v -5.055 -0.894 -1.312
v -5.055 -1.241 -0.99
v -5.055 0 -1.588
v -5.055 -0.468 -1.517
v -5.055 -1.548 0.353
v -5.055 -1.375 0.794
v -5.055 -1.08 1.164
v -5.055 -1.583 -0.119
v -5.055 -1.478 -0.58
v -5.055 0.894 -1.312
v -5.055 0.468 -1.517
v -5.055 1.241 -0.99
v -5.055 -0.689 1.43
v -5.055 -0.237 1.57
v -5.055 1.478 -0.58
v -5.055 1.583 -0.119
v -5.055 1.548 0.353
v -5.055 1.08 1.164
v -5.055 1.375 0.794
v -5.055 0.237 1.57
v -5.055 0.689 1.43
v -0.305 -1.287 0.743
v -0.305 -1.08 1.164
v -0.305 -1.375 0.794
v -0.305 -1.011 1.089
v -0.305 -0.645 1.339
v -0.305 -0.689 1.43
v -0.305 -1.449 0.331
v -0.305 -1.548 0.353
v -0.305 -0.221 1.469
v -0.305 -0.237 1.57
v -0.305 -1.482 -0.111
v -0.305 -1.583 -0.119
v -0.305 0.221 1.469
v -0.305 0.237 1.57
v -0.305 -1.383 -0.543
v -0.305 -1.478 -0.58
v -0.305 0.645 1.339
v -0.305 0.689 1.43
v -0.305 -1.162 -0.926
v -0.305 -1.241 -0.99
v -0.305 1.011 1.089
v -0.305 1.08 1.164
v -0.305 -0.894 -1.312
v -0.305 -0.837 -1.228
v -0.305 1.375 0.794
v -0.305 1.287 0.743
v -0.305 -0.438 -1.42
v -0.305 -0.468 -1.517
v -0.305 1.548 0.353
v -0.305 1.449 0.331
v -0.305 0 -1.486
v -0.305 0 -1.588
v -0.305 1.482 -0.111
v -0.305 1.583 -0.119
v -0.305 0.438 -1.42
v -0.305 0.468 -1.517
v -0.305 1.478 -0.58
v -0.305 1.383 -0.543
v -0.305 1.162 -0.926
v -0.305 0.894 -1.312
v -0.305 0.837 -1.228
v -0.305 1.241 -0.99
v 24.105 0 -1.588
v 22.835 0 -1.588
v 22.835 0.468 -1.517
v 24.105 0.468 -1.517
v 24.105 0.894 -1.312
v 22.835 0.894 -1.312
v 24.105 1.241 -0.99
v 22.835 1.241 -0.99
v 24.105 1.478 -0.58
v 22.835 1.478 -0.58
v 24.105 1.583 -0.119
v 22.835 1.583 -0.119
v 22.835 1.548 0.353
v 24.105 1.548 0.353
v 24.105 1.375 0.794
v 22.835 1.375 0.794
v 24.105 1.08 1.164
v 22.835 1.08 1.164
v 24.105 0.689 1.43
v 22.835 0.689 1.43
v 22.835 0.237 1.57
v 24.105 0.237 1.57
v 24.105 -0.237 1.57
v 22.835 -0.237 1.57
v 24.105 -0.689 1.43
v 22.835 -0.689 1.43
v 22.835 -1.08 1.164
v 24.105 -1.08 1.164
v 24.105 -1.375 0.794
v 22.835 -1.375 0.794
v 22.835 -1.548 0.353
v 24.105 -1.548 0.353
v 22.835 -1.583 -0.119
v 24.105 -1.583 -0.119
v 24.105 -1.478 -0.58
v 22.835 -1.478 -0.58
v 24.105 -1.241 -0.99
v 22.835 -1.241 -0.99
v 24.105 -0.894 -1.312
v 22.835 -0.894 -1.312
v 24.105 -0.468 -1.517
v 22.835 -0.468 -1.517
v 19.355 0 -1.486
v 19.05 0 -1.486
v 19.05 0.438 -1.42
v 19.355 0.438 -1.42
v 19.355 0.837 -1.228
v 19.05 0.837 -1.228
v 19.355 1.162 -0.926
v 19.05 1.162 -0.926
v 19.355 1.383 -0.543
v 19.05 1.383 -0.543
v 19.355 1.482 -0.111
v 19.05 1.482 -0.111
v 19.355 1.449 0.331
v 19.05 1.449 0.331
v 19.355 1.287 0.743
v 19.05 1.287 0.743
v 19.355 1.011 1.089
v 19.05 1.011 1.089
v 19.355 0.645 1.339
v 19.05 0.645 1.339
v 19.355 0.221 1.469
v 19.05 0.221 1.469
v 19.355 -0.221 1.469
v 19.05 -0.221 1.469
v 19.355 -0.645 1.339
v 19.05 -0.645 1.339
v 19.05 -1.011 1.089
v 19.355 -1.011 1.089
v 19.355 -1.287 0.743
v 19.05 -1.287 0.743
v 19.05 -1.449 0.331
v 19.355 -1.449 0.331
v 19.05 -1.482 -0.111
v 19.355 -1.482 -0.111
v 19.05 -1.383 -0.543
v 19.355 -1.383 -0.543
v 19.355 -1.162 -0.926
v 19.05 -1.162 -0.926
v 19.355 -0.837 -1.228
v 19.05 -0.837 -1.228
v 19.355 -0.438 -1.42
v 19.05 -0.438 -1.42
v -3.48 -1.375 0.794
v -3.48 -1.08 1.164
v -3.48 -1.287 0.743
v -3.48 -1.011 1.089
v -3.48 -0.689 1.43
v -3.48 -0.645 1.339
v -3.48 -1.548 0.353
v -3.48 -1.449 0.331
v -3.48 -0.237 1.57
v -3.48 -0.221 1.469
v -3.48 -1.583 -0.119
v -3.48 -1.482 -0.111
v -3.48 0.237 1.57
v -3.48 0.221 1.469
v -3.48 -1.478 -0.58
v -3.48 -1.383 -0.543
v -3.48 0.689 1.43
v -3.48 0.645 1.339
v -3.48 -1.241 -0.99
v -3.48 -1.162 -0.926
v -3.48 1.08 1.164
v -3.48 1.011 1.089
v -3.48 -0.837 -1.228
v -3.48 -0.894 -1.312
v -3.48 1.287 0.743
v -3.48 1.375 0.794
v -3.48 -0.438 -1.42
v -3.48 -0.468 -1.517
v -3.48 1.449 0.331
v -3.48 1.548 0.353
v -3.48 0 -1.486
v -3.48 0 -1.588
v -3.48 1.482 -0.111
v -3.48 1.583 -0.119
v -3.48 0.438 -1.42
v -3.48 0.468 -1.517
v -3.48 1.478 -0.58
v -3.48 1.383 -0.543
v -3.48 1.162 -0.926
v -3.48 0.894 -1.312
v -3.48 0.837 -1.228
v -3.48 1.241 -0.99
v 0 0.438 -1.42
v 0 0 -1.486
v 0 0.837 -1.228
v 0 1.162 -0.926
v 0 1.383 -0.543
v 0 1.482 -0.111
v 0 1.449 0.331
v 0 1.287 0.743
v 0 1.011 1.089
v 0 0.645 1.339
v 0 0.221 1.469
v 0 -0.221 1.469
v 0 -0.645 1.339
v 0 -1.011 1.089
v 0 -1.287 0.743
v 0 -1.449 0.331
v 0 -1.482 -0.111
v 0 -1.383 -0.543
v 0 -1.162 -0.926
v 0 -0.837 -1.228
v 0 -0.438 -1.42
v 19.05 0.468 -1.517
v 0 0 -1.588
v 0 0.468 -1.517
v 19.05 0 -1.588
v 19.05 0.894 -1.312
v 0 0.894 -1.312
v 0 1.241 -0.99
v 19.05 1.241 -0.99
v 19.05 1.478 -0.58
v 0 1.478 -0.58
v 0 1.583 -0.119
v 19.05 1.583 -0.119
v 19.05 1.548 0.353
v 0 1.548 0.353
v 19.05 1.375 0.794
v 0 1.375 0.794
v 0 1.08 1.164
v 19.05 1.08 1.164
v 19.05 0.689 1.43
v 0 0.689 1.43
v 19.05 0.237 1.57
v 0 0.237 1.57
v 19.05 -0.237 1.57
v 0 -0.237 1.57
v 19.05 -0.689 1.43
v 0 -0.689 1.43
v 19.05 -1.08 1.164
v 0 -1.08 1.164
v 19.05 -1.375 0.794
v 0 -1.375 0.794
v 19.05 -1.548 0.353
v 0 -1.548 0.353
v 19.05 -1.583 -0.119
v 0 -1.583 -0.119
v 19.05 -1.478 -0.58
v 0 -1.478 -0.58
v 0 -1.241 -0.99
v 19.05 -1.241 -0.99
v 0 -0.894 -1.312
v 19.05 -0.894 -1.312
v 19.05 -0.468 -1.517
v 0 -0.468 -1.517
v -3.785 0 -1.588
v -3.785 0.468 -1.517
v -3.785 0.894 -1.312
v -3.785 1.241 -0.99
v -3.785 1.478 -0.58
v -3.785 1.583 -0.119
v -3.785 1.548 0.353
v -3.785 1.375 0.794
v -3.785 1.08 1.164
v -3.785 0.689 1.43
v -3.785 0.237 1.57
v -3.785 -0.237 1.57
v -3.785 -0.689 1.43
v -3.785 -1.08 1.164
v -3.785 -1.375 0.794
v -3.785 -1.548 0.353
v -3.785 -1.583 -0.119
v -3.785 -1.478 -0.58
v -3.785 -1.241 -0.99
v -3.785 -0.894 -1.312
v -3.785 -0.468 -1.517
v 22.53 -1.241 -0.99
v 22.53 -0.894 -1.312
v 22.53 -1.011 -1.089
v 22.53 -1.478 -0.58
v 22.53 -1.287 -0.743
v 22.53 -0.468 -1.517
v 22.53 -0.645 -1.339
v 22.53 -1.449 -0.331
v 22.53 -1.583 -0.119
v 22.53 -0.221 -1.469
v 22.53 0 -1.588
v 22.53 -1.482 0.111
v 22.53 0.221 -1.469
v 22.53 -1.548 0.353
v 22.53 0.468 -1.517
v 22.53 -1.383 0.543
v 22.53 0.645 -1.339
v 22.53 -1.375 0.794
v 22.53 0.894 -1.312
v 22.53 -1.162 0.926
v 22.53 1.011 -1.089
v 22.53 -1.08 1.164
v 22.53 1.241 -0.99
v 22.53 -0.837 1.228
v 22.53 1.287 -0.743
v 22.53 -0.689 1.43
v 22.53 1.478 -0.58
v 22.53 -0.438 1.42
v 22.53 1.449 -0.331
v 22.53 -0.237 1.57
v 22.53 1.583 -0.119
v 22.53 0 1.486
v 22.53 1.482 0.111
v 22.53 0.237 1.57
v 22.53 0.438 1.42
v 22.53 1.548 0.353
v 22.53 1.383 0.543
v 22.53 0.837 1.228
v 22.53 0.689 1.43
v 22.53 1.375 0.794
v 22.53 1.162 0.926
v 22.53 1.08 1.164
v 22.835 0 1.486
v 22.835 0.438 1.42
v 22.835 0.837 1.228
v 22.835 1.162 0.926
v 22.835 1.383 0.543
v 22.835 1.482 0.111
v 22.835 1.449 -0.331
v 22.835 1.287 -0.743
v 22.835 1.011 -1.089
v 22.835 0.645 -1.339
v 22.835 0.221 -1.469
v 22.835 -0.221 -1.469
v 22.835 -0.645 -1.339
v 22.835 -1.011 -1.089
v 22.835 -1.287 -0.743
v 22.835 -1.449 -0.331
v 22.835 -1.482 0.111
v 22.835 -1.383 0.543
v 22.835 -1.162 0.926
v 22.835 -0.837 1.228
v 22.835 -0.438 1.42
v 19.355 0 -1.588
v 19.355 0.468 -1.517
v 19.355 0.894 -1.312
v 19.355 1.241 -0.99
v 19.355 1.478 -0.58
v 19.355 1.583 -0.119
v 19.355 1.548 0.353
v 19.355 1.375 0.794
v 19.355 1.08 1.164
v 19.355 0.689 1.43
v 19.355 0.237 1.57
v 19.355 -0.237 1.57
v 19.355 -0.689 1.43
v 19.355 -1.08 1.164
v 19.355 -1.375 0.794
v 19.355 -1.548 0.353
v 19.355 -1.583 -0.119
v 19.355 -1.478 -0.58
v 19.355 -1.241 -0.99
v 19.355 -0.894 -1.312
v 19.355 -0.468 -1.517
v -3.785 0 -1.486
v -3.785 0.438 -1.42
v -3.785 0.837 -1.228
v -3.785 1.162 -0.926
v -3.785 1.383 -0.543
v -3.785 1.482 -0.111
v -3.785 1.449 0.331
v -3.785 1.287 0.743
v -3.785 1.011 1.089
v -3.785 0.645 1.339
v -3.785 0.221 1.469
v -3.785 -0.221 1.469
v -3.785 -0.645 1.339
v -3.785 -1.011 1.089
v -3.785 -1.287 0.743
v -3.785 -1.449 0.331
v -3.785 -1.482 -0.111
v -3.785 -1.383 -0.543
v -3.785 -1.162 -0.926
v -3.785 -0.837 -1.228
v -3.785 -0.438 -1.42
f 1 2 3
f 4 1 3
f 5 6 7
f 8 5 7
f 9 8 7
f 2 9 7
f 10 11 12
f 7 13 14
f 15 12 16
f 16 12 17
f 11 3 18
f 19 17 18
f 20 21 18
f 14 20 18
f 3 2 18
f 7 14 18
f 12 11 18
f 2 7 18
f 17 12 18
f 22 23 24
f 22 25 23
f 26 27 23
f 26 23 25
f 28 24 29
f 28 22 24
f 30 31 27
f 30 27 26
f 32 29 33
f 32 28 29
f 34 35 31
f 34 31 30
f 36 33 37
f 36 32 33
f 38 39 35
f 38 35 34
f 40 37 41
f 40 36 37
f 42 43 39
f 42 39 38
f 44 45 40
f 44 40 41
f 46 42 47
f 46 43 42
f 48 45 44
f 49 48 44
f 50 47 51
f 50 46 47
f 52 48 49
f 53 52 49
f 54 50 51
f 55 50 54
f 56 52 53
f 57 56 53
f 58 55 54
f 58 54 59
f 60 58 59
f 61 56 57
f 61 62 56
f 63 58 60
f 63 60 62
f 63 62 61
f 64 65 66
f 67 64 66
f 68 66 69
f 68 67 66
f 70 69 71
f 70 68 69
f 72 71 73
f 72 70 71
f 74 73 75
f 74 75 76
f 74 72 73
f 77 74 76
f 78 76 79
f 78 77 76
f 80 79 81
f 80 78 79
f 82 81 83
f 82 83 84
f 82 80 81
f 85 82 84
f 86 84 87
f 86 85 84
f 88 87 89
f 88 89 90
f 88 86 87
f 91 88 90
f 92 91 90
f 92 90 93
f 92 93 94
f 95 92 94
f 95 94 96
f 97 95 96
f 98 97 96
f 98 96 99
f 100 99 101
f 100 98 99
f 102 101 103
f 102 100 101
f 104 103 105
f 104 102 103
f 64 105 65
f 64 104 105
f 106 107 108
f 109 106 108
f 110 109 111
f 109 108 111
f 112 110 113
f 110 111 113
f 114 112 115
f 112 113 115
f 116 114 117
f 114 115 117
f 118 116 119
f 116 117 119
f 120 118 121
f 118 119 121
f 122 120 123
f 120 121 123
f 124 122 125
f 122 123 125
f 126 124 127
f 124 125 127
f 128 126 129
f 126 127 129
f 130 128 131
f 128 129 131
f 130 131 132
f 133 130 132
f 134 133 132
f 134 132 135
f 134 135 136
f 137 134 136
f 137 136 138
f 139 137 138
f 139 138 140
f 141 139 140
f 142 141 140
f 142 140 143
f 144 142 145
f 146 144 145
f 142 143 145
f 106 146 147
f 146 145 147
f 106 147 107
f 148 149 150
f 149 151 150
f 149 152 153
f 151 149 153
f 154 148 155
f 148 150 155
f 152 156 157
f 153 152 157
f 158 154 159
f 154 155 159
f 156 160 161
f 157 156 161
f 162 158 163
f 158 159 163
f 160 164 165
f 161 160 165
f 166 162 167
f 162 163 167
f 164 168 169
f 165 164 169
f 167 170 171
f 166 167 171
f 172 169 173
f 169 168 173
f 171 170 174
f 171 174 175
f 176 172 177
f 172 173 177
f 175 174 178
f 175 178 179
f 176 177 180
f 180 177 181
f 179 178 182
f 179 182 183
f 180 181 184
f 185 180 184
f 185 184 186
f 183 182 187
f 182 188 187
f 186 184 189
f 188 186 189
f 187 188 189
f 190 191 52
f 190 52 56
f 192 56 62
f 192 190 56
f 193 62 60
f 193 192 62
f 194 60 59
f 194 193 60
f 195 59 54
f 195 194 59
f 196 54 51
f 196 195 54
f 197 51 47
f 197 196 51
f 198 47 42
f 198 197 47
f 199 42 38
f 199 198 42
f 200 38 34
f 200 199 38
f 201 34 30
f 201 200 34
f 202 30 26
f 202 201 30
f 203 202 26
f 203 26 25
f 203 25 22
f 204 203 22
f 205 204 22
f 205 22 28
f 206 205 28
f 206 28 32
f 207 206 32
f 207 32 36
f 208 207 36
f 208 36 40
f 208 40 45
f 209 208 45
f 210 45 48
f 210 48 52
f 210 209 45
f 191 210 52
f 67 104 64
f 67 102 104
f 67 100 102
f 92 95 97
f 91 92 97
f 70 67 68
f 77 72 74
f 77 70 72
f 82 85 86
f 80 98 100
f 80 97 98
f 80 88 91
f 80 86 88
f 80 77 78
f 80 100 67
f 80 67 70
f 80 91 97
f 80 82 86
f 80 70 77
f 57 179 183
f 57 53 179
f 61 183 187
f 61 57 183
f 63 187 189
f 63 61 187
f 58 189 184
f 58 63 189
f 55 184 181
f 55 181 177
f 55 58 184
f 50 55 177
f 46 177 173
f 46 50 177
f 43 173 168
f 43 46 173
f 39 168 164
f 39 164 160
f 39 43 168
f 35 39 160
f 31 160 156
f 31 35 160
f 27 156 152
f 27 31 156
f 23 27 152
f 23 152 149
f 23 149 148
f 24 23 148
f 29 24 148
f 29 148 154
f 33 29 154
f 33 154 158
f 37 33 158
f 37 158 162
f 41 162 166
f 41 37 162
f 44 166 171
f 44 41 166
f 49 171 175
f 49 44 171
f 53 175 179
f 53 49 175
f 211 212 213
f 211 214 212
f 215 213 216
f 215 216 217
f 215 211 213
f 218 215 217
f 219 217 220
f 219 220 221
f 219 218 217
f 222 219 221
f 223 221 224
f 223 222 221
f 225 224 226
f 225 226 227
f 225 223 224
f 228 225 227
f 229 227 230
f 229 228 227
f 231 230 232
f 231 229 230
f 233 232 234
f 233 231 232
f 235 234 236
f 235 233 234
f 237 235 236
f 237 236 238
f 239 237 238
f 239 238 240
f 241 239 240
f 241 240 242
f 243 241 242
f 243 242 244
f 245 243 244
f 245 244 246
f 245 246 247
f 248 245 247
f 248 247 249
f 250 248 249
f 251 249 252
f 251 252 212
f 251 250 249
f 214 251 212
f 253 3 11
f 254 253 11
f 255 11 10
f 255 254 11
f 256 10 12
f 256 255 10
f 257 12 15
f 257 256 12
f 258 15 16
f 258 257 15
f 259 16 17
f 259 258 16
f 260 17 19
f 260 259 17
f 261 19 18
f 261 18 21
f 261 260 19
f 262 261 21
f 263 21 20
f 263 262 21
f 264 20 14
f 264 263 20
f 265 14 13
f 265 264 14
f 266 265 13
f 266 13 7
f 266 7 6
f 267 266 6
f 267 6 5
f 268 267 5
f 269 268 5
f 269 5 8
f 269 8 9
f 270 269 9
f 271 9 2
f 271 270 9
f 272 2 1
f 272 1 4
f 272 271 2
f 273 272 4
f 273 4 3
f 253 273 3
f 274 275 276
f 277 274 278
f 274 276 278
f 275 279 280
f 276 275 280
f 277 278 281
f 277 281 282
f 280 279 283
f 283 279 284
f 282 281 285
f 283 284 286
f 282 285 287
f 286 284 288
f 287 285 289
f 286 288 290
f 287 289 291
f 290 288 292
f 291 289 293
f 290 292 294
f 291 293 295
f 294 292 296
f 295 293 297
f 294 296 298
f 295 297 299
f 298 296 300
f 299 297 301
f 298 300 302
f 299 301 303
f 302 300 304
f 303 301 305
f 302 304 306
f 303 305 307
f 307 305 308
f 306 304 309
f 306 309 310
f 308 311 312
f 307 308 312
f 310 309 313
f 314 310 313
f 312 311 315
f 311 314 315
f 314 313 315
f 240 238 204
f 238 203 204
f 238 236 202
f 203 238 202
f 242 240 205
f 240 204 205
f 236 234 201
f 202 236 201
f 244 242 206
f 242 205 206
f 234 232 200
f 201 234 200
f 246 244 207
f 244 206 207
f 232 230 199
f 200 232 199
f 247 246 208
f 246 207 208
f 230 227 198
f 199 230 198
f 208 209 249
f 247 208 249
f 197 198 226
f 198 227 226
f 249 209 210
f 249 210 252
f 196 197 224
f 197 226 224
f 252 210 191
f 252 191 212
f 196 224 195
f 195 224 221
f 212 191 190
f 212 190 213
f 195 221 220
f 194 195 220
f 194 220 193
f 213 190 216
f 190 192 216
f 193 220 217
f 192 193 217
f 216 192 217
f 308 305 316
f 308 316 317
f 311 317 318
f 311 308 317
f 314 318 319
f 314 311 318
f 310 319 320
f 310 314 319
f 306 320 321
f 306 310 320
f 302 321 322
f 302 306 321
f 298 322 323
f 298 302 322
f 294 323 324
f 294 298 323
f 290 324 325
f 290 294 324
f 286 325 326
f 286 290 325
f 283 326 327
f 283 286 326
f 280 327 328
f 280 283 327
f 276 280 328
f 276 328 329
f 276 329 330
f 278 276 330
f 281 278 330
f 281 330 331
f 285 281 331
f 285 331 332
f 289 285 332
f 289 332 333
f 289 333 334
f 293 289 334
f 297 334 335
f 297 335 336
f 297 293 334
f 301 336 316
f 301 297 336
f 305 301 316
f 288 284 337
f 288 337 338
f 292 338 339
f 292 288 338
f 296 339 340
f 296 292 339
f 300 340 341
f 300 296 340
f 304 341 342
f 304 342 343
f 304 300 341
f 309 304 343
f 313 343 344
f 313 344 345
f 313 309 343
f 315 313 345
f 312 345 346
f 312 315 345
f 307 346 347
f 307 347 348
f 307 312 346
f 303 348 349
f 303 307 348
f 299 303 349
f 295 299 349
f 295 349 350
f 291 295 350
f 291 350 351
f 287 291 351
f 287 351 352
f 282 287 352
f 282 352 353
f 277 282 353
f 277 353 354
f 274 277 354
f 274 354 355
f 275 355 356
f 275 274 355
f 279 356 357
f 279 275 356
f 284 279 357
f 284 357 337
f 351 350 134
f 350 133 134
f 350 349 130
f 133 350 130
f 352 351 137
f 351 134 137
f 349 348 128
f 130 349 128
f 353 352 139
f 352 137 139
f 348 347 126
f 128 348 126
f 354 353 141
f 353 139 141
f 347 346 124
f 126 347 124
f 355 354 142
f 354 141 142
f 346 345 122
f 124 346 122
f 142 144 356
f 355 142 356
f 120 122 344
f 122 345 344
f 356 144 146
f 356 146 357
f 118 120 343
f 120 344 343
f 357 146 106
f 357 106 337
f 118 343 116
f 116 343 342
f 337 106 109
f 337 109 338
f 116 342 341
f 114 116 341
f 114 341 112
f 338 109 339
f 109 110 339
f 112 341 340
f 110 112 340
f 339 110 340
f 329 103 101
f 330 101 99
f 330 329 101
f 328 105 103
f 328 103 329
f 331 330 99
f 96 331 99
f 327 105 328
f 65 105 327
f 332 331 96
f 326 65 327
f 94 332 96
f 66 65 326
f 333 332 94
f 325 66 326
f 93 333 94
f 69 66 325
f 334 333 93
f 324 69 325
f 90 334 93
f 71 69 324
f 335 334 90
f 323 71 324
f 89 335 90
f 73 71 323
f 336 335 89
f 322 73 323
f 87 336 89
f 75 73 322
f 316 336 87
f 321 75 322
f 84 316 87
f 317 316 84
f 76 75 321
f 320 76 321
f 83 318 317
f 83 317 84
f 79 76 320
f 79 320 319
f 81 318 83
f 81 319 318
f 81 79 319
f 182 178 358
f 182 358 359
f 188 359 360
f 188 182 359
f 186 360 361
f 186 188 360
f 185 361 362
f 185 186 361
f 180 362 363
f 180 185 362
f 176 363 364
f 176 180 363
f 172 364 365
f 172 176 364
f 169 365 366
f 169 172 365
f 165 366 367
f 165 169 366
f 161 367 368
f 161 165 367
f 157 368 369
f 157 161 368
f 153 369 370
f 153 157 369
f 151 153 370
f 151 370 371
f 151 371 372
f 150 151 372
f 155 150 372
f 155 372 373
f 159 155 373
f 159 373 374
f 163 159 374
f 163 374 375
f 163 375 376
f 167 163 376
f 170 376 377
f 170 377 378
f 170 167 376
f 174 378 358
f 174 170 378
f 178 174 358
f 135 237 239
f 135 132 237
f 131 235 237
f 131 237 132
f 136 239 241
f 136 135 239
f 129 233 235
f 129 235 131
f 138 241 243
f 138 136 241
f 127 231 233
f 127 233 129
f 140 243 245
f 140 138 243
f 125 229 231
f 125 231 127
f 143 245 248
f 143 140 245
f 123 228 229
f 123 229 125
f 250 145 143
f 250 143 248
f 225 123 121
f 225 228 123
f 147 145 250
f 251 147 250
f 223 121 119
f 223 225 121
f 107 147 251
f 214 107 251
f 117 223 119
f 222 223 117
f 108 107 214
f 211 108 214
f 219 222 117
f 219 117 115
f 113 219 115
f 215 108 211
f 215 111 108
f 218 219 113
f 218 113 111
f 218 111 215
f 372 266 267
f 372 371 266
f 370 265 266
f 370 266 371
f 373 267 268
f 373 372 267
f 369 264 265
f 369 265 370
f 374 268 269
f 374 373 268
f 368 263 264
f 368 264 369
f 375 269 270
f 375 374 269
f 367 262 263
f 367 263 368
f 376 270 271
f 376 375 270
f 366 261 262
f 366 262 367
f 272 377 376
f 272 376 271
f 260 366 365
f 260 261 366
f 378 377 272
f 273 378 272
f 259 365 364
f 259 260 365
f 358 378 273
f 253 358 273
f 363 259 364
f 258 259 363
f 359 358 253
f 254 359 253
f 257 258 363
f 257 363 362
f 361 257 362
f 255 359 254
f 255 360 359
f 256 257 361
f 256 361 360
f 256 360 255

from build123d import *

# Parameters (mm, degrees)
SKETCH2_R               = 1.5875
EXTRUDE1_DEPTH          = 25.4
EXTRUDE1_DEPTH_BACK     = 25.4
CHAMFER1_SIZE           = 0.3175
SKETCH3_OUTSIDE_W       = 15.376
SKETCH3_OUTSIDE_H       = 15.376
SKETCH3_OUTSIDE_R       = 1.4859
CUT_EXTRUDE1_DEPTH      = 0.3048
SKETCH4_OUTSIDE_W       = 15.376
SKETCH4_OUTSIDE_H       = 15.376
SKETCH4_OUTSIDE_R       = 1.4859
CUT_EXTRUDE2_DEPTH      = 0.3048
CUT_EXTRUDE4_START      = -3.175
SKETCH6_OUTSIDE_W       = 15.376
SKETCH6_OUTSIDE_H       = 15.376
SKETCH6_OUTSIDE_R       = 1.4859
CUT_EXTRUDE4_DEPTH      = 0.3048
CUT_EXTRUDE5_START      = -3.175
SKETCH8_OUTSIDE_W       = 15.376
SKETCH8_OUTSIDE_H       = 15.376
SKETCH8_OUTSIDE_R       = 1.4859
CUT_EXTRUDE5_DEPTH      = 0.3048
SKETCH5_W               = 20.3454
SKETCH5_H               = 6.35
SKETCH5_W_2             = 1.2954
CUT_EXTRUDE3_DEPTH      = 2.5875
CUT_EXTRUDE3_DEPTH_BACK = 2.5875


with BuildPart() as part:
    # Sketch2 → Extrude1 (new body, two sides)
    with BuildSketch(Plane(origin=(0, 0, 0), x_dir=(0, 0, -1), z_dir=(1, 0, 0))) as extrude1_sk:
        Circle(SKETCH2_R)
    extrude(amount=EXTRUDE1_DEPTH)
    extrude(extrude1_sk.sketch, amount=-EXTRUDE1_DEPTH_BACK)

    # Chamfer1
    chamfer1_edges = [part.edges().sort_by_distance(p)[0] for p in [
        (-25.4, 0, 1.5875),
        (25.4, 0, 1.5875),
    ]]
    chamfer(chamfer1_edges, length=CHAMFER1_SIZE)

    # Sketch3 outside → Cut-Extrude1 (cut)
    with BuildSketch(Plane(origin=(19.05, 0, 0), x_dir=(0, 0, -1), z_dir=(1, 0, 0))):
        Rectangle(SKETCH3_OUTSIDE_W, SKETCH3_OUTSIDE_H)
        Circle(SKETCH3_OUTSIDE_R, mode=Mode.SUBTRACT)
    extrude(amount=CUT_EXTRUDE1_DEPTH, mode=Mode.SUBTRACT)

    # Sketch4 outside → Cut-Extrude2 (cut)
    with BuildSketch(Plane(origin=(0, 0, 0), x_dir=(0, 0, -1), z_dir=(1, 0, 0))):
        Rectangle(SKETCH4_OUTSIDE_W, SKETCH4_OUTSIDE_H)
        Circle(SKETCH4_OUTSIDE_R, mode=Mode.SUBTRACT)
    extrude(amount=-CUT_EXTRUDE2_DEPTH, mode=Mode.SUBTRACT)

    # Sketch6 outside → Cut-Extrude4 (cut)
    with BuildSketch(Plane.ZY.offset(-19.3548).offset(CUT_EXTRUDE4_START)):
        Rectangle(SKETCH6_OUTSIDE_W, SKETCH6_OUTSIDE_H)
        Circle(SKETCH6_OUTSIDE_R, mode=Mode.SUBTRACT)
    extrude(amount=-CUT_EXTRUDE4_DEPTH, mode=Mode.SUBTRACT)

    # Sketch8 outside → Cut-Extrude5 (cut)
    with BuildSketch(Plane(origin=(-0.3048, 0, 0), x_dir=(0, 0, -1), z_dir=(1, 0, 0)).offset(CUT_EXTRUDE5_START)):
        Rectangle(SKETCH8_OUTSIDE_W, SKETCH8_OUTSIDE_H)
        Circle(SKETCH8_OUTSIDE_R, mode=Mode.SUBTRACT)
    extrude(amount=-CUT_EXTRUDE5_DEPTH, mode=Mode.SUBTRACT)

    # Sketch5 → Cut-Extrude3 (cut, two sides)
    with BuildSketch(Plane.XY) as cut_extrude3_sk:
        with Locations((-15.2273, 0)):
            Rectangle(SKETCH5_W, SKETCH5_H)
        with Locations((24.7523, 0)):
            Rectangle(SKETCH5_W_2, SKETCH5_H)
    extrude(amount=CUT_EXTRUDE3_DEPTH, mode=Mode.SUBTRACT)
    extrude(cut_extrude3_sk.sketch, amount=-CUT_EXTRUDE3_DEPTH_BACK, mode=Mode.SUBTRACT)


solid = part.part
